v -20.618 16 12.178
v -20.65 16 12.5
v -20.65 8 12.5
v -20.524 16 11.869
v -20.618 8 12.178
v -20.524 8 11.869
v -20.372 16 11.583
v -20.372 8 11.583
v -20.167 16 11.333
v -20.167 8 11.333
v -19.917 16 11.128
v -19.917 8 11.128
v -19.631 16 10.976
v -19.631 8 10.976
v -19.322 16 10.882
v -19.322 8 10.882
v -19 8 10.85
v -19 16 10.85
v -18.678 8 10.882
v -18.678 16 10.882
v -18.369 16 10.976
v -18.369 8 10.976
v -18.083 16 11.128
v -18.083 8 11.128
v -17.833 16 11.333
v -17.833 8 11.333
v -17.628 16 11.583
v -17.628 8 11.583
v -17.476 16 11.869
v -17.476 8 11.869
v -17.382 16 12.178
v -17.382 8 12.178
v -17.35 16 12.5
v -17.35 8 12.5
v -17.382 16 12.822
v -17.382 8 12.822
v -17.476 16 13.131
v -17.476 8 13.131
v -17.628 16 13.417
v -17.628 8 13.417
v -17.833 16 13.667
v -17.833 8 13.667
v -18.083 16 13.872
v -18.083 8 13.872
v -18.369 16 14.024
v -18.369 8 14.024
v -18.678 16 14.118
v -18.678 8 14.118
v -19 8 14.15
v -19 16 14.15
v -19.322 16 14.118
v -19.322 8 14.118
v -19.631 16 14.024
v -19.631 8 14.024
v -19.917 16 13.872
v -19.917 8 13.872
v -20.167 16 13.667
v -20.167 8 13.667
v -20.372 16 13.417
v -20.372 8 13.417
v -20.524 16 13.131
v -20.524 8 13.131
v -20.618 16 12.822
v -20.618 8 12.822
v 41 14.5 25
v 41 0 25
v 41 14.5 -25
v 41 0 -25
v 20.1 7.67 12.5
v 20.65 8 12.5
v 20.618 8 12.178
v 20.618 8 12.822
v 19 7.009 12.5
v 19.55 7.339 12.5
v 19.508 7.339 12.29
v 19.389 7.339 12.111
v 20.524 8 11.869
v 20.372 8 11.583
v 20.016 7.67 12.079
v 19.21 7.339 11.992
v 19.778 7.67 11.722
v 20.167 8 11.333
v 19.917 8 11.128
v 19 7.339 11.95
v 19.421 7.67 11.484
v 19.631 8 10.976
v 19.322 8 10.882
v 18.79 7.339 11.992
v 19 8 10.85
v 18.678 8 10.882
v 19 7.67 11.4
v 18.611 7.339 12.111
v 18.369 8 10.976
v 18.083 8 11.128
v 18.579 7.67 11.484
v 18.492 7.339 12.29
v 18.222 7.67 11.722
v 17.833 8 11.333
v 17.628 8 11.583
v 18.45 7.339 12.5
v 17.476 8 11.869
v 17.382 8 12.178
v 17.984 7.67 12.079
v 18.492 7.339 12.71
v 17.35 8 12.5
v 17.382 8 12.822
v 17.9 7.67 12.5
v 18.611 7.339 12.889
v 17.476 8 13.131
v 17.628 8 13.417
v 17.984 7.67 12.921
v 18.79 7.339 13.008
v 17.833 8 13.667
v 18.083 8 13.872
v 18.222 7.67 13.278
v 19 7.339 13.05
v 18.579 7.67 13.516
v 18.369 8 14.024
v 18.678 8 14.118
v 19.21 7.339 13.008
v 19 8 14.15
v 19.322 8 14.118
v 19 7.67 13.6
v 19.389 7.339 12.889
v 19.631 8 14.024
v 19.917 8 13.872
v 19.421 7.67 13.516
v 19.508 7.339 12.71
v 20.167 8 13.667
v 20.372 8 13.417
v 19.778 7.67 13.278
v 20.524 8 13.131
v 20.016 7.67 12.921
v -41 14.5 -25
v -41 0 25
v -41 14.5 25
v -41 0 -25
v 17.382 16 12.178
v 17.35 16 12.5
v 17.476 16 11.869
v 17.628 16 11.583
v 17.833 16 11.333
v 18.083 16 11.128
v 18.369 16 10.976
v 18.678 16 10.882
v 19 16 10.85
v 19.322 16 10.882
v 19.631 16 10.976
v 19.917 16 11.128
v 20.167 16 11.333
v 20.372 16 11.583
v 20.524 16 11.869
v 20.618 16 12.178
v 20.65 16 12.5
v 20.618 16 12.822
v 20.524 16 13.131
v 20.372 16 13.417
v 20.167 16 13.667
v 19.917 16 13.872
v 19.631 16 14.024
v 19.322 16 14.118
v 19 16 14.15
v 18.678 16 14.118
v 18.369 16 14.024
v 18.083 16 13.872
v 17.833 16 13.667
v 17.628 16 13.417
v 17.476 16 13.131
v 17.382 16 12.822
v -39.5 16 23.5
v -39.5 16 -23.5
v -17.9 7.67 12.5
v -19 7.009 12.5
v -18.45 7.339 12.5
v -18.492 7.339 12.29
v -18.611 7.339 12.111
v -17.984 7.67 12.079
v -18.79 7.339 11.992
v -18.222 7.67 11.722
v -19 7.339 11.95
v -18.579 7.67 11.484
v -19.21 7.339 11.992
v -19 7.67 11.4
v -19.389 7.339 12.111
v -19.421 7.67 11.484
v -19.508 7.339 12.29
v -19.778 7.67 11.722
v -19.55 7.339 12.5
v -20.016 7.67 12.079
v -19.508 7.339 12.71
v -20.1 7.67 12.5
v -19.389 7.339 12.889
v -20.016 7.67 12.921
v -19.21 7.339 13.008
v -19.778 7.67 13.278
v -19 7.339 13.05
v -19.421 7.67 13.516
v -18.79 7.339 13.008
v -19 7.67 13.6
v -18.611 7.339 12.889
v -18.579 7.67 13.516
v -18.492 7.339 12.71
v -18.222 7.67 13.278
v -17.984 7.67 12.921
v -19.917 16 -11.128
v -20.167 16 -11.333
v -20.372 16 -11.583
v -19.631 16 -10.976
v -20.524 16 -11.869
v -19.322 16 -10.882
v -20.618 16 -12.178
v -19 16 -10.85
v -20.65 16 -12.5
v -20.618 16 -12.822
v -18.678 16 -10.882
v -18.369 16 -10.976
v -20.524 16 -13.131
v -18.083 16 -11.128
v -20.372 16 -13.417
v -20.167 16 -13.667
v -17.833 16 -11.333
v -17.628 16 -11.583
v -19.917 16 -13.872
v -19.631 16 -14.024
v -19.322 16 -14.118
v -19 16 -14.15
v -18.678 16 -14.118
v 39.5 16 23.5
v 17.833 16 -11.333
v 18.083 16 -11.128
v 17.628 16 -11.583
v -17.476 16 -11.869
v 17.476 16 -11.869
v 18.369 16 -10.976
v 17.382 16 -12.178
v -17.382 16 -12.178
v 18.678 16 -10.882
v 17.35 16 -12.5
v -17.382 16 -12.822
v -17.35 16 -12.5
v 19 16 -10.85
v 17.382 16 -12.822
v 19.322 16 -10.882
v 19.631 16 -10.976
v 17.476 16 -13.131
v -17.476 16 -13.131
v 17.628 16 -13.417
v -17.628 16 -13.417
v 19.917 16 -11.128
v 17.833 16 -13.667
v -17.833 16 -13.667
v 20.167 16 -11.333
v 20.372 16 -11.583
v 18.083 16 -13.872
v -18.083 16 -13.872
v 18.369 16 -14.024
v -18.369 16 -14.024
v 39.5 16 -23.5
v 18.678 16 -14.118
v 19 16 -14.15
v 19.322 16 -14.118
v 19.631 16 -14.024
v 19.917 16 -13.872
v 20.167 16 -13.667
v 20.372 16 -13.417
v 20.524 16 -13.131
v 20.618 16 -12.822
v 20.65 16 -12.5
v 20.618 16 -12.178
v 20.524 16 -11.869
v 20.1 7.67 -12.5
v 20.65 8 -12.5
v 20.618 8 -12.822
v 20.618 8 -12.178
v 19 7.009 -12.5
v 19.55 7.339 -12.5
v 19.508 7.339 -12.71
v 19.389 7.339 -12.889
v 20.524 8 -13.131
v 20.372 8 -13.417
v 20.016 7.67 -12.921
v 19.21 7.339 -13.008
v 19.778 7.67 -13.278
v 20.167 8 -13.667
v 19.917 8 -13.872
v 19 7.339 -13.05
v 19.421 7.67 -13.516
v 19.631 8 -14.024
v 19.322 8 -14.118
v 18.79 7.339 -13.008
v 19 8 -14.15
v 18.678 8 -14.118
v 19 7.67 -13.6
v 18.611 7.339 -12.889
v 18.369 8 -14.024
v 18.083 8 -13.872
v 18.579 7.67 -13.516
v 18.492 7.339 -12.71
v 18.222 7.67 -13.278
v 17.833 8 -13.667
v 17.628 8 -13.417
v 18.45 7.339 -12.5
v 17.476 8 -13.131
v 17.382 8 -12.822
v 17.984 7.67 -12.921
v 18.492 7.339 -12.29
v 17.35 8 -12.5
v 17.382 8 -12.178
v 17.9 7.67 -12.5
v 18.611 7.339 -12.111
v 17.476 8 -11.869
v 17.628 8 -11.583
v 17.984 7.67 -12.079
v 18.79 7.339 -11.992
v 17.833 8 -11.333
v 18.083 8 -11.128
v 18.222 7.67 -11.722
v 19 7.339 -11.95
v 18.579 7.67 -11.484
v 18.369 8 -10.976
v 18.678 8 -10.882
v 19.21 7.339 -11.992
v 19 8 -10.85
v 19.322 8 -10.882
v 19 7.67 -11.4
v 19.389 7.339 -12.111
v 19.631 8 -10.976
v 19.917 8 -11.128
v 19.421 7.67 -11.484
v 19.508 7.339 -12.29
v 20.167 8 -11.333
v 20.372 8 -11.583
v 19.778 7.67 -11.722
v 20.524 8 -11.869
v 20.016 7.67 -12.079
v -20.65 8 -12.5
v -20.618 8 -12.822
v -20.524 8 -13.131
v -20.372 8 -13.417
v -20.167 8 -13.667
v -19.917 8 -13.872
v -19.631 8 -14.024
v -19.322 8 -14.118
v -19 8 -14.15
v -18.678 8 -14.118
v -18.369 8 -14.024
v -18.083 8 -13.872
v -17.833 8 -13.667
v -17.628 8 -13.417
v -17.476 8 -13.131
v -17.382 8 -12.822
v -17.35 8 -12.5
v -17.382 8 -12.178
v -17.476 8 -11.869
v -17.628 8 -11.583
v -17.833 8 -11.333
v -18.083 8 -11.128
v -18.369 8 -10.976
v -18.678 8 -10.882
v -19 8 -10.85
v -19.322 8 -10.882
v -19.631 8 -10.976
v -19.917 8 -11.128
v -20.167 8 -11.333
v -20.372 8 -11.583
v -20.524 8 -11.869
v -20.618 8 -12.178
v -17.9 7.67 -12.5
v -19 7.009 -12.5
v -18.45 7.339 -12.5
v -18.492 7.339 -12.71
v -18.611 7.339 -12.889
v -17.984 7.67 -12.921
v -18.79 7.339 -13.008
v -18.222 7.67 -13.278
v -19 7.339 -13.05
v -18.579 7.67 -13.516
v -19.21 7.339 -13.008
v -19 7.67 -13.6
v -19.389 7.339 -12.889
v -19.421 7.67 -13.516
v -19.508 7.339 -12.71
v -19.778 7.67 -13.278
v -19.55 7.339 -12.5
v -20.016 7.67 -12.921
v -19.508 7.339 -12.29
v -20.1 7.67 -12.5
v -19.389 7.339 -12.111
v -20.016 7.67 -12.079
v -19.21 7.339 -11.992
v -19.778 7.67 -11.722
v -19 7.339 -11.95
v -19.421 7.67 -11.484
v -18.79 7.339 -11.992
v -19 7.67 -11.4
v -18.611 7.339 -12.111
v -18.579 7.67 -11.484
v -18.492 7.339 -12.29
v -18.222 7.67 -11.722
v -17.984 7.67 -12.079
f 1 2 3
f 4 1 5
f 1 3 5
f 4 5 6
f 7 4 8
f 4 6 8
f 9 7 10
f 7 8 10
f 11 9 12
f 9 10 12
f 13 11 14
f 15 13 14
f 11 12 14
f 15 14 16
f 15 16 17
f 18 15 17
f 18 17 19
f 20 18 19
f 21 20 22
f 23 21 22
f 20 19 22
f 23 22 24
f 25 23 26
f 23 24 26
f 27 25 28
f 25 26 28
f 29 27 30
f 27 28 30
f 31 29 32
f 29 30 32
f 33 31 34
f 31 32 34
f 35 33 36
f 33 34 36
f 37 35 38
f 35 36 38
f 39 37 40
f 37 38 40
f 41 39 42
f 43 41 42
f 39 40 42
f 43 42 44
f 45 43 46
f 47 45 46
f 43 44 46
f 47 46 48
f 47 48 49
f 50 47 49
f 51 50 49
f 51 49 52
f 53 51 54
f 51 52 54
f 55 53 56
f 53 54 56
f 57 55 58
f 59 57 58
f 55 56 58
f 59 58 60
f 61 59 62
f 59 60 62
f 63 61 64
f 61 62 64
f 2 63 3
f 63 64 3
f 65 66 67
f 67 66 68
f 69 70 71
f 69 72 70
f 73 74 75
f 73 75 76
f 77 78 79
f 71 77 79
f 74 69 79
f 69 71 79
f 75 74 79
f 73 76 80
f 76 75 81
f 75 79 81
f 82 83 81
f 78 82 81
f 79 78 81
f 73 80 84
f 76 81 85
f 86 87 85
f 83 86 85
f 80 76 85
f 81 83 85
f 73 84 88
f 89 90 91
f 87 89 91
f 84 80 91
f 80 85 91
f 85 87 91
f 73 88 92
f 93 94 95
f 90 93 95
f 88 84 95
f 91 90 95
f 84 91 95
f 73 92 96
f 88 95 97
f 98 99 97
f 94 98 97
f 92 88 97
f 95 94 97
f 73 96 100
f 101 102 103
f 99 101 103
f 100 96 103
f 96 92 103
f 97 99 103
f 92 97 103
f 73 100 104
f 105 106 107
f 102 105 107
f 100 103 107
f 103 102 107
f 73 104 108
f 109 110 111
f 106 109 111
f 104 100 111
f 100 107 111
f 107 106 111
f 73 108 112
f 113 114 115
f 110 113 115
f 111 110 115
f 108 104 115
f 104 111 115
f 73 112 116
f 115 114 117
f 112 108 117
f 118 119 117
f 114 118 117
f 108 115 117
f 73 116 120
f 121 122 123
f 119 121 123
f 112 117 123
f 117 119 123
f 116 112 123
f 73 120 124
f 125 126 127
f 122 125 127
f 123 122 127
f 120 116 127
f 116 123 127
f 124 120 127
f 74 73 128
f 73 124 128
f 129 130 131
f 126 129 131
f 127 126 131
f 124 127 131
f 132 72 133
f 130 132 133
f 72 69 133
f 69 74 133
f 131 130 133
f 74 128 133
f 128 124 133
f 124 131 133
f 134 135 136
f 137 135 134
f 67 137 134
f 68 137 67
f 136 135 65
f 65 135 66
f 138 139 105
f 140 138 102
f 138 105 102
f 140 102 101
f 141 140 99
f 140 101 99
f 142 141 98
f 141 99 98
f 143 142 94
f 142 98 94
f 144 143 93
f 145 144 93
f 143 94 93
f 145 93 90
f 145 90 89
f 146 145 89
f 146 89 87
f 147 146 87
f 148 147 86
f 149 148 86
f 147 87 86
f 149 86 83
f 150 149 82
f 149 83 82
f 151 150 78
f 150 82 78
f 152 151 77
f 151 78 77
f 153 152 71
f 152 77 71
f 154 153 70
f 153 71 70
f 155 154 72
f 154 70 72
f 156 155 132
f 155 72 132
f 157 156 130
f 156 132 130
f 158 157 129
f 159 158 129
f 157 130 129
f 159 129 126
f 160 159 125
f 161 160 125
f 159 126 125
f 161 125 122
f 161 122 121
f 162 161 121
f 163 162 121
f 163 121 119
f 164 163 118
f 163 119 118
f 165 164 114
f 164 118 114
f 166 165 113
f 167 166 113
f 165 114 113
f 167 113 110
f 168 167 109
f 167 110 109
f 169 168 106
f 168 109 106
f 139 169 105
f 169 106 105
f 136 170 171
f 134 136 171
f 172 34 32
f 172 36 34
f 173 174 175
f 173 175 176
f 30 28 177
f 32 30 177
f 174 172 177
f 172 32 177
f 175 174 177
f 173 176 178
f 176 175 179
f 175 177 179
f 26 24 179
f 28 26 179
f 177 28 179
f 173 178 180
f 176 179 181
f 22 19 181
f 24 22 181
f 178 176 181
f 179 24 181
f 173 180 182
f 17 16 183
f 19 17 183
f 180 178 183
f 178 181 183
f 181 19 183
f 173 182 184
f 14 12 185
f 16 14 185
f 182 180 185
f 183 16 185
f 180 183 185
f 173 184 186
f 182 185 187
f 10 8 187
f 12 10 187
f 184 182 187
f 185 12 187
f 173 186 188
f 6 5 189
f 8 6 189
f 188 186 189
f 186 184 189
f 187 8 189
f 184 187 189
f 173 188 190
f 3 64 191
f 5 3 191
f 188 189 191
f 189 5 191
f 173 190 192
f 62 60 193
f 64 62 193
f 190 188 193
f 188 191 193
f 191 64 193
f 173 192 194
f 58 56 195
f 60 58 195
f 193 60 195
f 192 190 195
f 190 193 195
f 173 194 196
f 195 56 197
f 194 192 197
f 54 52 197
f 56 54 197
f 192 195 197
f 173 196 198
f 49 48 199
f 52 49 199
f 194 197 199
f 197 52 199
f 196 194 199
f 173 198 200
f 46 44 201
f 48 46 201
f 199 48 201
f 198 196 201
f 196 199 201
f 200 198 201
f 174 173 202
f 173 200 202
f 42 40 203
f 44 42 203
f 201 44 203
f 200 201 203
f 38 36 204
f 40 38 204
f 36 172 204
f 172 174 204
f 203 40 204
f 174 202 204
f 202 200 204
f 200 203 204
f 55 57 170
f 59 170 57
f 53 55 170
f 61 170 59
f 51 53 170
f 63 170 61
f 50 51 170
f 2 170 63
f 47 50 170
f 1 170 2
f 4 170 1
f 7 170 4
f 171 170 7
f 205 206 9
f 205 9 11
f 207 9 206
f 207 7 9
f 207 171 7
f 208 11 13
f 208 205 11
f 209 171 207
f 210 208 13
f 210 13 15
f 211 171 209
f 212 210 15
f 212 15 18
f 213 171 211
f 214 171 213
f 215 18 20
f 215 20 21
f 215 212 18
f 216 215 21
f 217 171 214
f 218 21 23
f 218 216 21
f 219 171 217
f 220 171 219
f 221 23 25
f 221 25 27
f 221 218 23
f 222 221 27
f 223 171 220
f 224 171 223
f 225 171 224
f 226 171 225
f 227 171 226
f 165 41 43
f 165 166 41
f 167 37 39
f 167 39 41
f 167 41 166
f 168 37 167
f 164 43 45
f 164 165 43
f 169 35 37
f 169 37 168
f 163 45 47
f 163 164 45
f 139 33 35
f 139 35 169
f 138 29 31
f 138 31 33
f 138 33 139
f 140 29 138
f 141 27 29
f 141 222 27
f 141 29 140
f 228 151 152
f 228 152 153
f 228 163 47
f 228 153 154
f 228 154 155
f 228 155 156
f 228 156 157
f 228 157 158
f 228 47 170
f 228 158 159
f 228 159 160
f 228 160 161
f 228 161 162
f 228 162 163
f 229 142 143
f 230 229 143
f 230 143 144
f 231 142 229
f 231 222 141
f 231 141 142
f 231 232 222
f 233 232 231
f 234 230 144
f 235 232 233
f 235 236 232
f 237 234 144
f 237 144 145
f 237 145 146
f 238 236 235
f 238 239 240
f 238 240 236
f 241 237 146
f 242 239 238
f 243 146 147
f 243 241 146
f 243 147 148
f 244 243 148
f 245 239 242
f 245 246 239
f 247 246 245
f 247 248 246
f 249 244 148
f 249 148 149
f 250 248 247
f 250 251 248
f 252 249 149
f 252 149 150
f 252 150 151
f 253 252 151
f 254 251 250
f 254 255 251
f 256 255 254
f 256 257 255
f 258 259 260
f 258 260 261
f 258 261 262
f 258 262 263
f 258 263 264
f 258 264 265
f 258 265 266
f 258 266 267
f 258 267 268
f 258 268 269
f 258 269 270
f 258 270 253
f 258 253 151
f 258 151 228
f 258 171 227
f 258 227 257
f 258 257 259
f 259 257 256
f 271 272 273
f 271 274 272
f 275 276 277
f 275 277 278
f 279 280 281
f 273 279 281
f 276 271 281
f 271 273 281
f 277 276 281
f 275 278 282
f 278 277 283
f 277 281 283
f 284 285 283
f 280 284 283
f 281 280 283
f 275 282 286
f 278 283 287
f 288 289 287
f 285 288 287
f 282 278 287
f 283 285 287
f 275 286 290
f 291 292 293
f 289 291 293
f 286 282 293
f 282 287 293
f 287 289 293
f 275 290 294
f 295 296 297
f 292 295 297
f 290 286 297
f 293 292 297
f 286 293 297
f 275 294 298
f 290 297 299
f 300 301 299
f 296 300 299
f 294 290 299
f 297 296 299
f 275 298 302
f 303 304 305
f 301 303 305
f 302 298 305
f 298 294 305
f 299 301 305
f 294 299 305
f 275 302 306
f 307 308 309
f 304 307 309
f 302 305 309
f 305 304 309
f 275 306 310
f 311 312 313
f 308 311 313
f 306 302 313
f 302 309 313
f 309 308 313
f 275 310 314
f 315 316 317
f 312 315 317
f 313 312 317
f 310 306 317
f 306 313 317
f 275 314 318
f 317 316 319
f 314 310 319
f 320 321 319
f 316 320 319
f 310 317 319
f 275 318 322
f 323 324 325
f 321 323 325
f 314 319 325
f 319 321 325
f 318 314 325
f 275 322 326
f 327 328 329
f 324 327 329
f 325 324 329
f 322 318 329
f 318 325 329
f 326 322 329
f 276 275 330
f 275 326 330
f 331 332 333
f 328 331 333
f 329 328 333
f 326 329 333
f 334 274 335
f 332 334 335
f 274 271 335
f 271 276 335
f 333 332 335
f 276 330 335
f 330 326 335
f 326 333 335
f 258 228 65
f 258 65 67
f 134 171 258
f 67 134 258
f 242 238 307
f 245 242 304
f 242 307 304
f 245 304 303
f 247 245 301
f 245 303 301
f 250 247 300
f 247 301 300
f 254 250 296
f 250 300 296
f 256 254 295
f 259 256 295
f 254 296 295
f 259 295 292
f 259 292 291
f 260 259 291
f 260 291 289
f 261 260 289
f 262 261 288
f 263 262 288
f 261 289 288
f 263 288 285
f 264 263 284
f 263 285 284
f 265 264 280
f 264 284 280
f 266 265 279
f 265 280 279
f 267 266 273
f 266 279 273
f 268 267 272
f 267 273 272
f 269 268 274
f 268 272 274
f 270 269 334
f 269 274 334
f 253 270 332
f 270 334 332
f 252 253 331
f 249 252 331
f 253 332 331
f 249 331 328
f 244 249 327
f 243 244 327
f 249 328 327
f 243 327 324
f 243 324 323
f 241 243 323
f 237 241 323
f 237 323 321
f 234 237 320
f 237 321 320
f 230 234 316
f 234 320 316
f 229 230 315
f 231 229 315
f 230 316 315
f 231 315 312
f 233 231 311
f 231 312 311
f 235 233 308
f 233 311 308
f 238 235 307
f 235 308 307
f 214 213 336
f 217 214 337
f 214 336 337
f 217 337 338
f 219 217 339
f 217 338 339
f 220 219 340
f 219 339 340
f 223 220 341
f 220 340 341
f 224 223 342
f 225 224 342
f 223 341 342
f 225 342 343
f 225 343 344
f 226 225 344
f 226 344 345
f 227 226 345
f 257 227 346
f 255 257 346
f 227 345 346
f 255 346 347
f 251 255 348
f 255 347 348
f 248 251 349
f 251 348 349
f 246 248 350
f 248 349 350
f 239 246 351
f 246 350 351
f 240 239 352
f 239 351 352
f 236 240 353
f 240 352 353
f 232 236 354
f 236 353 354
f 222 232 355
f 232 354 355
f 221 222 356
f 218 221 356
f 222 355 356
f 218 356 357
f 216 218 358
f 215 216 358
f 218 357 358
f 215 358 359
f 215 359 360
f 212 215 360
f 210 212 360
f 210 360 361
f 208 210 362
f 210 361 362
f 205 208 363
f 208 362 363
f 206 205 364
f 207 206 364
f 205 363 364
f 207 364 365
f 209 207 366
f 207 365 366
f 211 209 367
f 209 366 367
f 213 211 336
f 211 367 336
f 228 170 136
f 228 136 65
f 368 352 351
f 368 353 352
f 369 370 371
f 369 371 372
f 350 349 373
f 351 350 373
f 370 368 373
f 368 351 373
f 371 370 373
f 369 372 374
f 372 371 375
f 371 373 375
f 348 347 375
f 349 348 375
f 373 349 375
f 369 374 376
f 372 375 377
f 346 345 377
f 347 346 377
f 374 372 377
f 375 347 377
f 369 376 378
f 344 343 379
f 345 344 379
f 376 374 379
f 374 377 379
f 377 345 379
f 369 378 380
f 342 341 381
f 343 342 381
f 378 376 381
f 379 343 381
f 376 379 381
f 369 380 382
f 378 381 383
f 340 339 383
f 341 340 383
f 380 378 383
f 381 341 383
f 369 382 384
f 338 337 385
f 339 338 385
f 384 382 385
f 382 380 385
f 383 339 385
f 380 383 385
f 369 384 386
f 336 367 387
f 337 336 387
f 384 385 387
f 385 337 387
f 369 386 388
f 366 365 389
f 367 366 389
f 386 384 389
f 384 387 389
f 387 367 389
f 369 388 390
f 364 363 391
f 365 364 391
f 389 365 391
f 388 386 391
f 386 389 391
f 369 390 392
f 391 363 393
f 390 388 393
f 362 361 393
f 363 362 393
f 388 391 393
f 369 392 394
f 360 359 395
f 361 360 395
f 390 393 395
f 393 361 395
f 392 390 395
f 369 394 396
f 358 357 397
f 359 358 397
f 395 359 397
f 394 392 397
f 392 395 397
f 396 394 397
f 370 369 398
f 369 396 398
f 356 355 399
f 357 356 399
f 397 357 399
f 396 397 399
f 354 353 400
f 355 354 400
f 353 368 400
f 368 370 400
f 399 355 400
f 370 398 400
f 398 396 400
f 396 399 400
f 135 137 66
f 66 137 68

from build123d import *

# Parameters (mm, degrees)
SKETCH1_W             = 82
SKETCH1_H             = 50
BOSS_EXTRUDE2_DEPTH   = 16
CHAMFER1_SIZE         = 1.5
M4_TAPPED_HOLE1_D     = 3.3
M4_TAPPED_HOLE1_DEPTH = 8
M4_TAPPED_HOLE1_TIP   = 0.991420021


with BuildPart() as part:
    # Sketch1 → Boss-Extrude2 (new body)
    with BuildSketch(Plane(origin=(0, 0, 0), x_dir=(1, 0, 0), z_dir=(0, 1, 0))):
        Rectangle(SKETCH1_W, SKETCH1_H)
    extrude(amount=BOSS_EXTRUDE2_DEPTH)

    # Chamfer1
    chamfer1_edges = [part.edges().sort_by_distance(p)[0] for p in [
        (41, 16, 0),
        (0, 16, -25),
        (-41, 16, 0),
        (0, 16, 25),
    ]]
    chamfer(chamfer1_edges, length=CHAMFER1_SIZE)

    # M4 Tapped Hole1
    with Locations(Plane(origin=(0, 16, 0), x_dir=(1, 0, 0), z_dir=(0, 1, 0))):
        with Locations((-19, 12.5), (19, 12.5), (19, -12.5), (-19, -12.5)):
            Hole(M4_TAPPED_HOLE1_D / 2, depth=M4_TAPPED_HOLE1_DEPTH)
            with Locations((0, 0, -(M4_TAPPED_HOLE1_DEPTH + M4_TAPPED_HOLE1_TIP / 2))):  # 118° drill point
                Cone(0, M4_TAPPED_HOLE1_D / 2, M4_TAPPED_HOLE1_TIP, mode=Mode.SUBTRACT)


solid = part.part
